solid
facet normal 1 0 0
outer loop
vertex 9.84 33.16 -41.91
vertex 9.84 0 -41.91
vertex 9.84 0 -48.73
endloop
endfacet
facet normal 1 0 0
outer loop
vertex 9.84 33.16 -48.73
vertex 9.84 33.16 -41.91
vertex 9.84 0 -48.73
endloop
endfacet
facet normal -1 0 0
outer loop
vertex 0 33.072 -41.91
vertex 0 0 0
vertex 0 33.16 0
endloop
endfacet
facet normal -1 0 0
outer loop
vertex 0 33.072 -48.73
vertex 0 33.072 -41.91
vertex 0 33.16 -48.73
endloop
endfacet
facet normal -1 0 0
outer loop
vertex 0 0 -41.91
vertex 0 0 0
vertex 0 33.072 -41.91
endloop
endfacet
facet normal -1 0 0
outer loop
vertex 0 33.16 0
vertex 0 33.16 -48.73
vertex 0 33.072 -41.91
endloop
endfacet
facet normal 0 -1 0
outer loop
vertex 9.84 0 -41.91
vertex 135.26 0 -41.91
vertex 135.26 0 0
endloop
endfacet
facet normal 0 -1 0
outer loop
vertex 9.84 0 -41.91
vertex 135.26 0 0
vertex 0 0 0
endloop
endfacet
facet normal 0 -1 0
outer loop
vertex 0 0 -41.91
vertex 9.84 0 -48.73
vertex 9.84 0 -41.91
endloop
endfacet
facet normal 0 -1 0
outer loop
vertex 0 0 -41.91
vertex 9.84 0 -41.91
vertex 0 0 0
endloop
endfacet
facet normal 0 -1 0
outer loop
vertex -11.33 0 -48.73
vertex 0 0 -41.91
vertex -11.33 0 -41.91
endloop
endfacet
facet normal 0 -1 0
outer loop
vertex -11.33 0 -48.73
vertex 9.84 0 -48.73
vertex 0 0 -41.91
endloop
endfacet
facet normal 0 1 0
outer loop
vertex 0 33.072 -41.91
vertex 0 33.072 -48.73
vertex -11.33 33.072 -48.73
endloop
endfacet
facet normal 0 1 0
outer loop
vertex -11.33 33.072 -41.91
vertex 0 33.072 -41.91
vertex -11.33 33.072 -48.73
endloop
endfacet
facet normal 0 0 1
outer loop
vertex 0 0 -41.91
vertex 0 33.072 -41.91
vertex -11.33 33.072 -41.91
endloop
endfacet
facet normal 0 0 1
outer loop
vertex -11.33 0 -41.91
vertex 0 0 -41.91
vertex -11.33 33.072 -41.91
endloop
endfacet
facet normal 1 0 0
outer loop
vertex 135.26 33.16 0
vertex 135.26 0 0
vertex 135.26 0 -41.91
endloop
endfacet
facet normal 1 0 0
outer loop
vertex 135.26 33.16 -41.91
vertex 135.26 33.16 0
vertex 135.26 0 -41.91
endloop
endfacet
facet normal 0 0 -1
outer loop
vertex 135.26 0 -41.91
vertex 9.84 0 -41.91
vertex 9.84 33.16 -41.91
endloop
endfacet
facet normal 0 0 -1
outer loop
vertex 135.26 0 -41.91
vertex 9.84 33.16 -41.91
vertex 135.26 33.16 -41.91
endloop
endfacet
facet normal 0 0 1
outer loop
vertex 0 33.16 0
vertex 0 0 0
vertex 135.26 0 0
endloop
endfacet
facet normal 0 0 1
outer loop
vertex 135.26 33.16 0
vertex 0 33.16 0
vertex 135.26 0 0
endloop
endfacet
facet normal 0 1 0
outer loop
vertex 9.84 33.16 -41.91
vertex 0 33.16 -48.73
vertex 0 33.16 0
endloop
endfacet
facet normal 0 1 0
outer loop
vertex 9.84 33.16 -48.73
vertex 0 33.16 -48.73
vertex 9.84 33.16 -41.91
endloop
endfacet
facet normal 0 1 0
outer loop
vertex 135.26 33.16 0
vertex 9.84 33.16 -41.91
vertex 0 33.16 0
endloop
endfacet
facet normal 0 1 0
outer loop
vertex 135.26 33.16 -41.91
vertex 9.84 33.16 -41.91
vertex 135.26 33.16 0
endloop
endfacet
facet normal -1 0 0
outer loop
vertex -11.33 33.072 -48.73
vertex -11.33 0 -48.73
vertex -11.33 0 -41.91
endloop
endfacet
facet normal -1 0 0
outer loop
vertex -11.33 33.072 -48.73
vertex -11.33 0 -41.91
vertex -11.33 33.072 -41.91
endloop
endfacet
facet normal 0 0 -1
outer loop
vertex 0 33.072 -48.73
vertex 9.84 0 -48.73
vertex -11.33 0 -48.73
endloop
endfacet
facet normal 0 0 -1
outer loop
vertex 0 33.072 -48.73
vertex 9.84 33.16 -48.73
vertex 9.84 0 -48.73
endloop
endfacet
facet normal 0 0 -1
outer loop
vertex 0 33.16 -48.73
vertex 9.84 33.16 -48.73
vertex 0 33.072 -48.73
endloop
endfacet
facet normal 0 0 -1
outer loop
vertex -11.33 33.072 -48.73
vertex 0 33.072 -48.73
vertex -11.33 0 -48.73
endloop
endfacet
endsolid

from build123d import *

# Parameters (mm, degrees)
SKETCH2_W           = 135.26
SKETCH2_H           = 41.91
BOSS_EXTRUDE1_DEPTH = 33.16
SKETCH3_W           = 9.84
SKETCH3_H           = 6.82
BOSS_EXTRUDE2_DEPTH = 33.16
SKETCH7_W           = 11.33
SKETCH7_H           = 33.072325858
BOSS_EXTRUDE3_DEPTH = 6.82


with BuildPart() as part:
    # Sketch2 → Boss-Extrude1 (new body)
    with BuildSketch(Plane(origin=(0, 0, 0), x_dir=(1, 0, 0), z_dir=(0, 1, 0))):
        with Locations((67.63, 20.955)):
            Rectangle(SKETCH2_W, SKETCH2_H)
    extrude(amount=BOSS_EXTRUDE1_DEPTH)

    # Sketch3 → Boss-Extrude2 (add)
    with BuildSketch(Plane(origin=(0, 0, 0), x_dir=(1, 0, 0), z_dir=(0, 1, 0))):
        with Locations((4.92, 45.32)):
            Rectangle(SKETCH3_W, SKETCH3_H)
    extrude(amount=BOSS_EXTRUDE2_DEPTH)

    # Sketch7 → Boss-Extrude3 (add)
    with BuildSketch(Plane(origin=(0, 0, -48.73), x_dir=(-1, 0, 0), z_dir=(0, 0, -1))):
        with Locations((5.665, 16.536162929)):
            Rectangle(SKETCH7_W, SKETCH7_H)
    extrude(amount=-BOSS_EXTRUDE3_DEPTH)


solid = part.part
